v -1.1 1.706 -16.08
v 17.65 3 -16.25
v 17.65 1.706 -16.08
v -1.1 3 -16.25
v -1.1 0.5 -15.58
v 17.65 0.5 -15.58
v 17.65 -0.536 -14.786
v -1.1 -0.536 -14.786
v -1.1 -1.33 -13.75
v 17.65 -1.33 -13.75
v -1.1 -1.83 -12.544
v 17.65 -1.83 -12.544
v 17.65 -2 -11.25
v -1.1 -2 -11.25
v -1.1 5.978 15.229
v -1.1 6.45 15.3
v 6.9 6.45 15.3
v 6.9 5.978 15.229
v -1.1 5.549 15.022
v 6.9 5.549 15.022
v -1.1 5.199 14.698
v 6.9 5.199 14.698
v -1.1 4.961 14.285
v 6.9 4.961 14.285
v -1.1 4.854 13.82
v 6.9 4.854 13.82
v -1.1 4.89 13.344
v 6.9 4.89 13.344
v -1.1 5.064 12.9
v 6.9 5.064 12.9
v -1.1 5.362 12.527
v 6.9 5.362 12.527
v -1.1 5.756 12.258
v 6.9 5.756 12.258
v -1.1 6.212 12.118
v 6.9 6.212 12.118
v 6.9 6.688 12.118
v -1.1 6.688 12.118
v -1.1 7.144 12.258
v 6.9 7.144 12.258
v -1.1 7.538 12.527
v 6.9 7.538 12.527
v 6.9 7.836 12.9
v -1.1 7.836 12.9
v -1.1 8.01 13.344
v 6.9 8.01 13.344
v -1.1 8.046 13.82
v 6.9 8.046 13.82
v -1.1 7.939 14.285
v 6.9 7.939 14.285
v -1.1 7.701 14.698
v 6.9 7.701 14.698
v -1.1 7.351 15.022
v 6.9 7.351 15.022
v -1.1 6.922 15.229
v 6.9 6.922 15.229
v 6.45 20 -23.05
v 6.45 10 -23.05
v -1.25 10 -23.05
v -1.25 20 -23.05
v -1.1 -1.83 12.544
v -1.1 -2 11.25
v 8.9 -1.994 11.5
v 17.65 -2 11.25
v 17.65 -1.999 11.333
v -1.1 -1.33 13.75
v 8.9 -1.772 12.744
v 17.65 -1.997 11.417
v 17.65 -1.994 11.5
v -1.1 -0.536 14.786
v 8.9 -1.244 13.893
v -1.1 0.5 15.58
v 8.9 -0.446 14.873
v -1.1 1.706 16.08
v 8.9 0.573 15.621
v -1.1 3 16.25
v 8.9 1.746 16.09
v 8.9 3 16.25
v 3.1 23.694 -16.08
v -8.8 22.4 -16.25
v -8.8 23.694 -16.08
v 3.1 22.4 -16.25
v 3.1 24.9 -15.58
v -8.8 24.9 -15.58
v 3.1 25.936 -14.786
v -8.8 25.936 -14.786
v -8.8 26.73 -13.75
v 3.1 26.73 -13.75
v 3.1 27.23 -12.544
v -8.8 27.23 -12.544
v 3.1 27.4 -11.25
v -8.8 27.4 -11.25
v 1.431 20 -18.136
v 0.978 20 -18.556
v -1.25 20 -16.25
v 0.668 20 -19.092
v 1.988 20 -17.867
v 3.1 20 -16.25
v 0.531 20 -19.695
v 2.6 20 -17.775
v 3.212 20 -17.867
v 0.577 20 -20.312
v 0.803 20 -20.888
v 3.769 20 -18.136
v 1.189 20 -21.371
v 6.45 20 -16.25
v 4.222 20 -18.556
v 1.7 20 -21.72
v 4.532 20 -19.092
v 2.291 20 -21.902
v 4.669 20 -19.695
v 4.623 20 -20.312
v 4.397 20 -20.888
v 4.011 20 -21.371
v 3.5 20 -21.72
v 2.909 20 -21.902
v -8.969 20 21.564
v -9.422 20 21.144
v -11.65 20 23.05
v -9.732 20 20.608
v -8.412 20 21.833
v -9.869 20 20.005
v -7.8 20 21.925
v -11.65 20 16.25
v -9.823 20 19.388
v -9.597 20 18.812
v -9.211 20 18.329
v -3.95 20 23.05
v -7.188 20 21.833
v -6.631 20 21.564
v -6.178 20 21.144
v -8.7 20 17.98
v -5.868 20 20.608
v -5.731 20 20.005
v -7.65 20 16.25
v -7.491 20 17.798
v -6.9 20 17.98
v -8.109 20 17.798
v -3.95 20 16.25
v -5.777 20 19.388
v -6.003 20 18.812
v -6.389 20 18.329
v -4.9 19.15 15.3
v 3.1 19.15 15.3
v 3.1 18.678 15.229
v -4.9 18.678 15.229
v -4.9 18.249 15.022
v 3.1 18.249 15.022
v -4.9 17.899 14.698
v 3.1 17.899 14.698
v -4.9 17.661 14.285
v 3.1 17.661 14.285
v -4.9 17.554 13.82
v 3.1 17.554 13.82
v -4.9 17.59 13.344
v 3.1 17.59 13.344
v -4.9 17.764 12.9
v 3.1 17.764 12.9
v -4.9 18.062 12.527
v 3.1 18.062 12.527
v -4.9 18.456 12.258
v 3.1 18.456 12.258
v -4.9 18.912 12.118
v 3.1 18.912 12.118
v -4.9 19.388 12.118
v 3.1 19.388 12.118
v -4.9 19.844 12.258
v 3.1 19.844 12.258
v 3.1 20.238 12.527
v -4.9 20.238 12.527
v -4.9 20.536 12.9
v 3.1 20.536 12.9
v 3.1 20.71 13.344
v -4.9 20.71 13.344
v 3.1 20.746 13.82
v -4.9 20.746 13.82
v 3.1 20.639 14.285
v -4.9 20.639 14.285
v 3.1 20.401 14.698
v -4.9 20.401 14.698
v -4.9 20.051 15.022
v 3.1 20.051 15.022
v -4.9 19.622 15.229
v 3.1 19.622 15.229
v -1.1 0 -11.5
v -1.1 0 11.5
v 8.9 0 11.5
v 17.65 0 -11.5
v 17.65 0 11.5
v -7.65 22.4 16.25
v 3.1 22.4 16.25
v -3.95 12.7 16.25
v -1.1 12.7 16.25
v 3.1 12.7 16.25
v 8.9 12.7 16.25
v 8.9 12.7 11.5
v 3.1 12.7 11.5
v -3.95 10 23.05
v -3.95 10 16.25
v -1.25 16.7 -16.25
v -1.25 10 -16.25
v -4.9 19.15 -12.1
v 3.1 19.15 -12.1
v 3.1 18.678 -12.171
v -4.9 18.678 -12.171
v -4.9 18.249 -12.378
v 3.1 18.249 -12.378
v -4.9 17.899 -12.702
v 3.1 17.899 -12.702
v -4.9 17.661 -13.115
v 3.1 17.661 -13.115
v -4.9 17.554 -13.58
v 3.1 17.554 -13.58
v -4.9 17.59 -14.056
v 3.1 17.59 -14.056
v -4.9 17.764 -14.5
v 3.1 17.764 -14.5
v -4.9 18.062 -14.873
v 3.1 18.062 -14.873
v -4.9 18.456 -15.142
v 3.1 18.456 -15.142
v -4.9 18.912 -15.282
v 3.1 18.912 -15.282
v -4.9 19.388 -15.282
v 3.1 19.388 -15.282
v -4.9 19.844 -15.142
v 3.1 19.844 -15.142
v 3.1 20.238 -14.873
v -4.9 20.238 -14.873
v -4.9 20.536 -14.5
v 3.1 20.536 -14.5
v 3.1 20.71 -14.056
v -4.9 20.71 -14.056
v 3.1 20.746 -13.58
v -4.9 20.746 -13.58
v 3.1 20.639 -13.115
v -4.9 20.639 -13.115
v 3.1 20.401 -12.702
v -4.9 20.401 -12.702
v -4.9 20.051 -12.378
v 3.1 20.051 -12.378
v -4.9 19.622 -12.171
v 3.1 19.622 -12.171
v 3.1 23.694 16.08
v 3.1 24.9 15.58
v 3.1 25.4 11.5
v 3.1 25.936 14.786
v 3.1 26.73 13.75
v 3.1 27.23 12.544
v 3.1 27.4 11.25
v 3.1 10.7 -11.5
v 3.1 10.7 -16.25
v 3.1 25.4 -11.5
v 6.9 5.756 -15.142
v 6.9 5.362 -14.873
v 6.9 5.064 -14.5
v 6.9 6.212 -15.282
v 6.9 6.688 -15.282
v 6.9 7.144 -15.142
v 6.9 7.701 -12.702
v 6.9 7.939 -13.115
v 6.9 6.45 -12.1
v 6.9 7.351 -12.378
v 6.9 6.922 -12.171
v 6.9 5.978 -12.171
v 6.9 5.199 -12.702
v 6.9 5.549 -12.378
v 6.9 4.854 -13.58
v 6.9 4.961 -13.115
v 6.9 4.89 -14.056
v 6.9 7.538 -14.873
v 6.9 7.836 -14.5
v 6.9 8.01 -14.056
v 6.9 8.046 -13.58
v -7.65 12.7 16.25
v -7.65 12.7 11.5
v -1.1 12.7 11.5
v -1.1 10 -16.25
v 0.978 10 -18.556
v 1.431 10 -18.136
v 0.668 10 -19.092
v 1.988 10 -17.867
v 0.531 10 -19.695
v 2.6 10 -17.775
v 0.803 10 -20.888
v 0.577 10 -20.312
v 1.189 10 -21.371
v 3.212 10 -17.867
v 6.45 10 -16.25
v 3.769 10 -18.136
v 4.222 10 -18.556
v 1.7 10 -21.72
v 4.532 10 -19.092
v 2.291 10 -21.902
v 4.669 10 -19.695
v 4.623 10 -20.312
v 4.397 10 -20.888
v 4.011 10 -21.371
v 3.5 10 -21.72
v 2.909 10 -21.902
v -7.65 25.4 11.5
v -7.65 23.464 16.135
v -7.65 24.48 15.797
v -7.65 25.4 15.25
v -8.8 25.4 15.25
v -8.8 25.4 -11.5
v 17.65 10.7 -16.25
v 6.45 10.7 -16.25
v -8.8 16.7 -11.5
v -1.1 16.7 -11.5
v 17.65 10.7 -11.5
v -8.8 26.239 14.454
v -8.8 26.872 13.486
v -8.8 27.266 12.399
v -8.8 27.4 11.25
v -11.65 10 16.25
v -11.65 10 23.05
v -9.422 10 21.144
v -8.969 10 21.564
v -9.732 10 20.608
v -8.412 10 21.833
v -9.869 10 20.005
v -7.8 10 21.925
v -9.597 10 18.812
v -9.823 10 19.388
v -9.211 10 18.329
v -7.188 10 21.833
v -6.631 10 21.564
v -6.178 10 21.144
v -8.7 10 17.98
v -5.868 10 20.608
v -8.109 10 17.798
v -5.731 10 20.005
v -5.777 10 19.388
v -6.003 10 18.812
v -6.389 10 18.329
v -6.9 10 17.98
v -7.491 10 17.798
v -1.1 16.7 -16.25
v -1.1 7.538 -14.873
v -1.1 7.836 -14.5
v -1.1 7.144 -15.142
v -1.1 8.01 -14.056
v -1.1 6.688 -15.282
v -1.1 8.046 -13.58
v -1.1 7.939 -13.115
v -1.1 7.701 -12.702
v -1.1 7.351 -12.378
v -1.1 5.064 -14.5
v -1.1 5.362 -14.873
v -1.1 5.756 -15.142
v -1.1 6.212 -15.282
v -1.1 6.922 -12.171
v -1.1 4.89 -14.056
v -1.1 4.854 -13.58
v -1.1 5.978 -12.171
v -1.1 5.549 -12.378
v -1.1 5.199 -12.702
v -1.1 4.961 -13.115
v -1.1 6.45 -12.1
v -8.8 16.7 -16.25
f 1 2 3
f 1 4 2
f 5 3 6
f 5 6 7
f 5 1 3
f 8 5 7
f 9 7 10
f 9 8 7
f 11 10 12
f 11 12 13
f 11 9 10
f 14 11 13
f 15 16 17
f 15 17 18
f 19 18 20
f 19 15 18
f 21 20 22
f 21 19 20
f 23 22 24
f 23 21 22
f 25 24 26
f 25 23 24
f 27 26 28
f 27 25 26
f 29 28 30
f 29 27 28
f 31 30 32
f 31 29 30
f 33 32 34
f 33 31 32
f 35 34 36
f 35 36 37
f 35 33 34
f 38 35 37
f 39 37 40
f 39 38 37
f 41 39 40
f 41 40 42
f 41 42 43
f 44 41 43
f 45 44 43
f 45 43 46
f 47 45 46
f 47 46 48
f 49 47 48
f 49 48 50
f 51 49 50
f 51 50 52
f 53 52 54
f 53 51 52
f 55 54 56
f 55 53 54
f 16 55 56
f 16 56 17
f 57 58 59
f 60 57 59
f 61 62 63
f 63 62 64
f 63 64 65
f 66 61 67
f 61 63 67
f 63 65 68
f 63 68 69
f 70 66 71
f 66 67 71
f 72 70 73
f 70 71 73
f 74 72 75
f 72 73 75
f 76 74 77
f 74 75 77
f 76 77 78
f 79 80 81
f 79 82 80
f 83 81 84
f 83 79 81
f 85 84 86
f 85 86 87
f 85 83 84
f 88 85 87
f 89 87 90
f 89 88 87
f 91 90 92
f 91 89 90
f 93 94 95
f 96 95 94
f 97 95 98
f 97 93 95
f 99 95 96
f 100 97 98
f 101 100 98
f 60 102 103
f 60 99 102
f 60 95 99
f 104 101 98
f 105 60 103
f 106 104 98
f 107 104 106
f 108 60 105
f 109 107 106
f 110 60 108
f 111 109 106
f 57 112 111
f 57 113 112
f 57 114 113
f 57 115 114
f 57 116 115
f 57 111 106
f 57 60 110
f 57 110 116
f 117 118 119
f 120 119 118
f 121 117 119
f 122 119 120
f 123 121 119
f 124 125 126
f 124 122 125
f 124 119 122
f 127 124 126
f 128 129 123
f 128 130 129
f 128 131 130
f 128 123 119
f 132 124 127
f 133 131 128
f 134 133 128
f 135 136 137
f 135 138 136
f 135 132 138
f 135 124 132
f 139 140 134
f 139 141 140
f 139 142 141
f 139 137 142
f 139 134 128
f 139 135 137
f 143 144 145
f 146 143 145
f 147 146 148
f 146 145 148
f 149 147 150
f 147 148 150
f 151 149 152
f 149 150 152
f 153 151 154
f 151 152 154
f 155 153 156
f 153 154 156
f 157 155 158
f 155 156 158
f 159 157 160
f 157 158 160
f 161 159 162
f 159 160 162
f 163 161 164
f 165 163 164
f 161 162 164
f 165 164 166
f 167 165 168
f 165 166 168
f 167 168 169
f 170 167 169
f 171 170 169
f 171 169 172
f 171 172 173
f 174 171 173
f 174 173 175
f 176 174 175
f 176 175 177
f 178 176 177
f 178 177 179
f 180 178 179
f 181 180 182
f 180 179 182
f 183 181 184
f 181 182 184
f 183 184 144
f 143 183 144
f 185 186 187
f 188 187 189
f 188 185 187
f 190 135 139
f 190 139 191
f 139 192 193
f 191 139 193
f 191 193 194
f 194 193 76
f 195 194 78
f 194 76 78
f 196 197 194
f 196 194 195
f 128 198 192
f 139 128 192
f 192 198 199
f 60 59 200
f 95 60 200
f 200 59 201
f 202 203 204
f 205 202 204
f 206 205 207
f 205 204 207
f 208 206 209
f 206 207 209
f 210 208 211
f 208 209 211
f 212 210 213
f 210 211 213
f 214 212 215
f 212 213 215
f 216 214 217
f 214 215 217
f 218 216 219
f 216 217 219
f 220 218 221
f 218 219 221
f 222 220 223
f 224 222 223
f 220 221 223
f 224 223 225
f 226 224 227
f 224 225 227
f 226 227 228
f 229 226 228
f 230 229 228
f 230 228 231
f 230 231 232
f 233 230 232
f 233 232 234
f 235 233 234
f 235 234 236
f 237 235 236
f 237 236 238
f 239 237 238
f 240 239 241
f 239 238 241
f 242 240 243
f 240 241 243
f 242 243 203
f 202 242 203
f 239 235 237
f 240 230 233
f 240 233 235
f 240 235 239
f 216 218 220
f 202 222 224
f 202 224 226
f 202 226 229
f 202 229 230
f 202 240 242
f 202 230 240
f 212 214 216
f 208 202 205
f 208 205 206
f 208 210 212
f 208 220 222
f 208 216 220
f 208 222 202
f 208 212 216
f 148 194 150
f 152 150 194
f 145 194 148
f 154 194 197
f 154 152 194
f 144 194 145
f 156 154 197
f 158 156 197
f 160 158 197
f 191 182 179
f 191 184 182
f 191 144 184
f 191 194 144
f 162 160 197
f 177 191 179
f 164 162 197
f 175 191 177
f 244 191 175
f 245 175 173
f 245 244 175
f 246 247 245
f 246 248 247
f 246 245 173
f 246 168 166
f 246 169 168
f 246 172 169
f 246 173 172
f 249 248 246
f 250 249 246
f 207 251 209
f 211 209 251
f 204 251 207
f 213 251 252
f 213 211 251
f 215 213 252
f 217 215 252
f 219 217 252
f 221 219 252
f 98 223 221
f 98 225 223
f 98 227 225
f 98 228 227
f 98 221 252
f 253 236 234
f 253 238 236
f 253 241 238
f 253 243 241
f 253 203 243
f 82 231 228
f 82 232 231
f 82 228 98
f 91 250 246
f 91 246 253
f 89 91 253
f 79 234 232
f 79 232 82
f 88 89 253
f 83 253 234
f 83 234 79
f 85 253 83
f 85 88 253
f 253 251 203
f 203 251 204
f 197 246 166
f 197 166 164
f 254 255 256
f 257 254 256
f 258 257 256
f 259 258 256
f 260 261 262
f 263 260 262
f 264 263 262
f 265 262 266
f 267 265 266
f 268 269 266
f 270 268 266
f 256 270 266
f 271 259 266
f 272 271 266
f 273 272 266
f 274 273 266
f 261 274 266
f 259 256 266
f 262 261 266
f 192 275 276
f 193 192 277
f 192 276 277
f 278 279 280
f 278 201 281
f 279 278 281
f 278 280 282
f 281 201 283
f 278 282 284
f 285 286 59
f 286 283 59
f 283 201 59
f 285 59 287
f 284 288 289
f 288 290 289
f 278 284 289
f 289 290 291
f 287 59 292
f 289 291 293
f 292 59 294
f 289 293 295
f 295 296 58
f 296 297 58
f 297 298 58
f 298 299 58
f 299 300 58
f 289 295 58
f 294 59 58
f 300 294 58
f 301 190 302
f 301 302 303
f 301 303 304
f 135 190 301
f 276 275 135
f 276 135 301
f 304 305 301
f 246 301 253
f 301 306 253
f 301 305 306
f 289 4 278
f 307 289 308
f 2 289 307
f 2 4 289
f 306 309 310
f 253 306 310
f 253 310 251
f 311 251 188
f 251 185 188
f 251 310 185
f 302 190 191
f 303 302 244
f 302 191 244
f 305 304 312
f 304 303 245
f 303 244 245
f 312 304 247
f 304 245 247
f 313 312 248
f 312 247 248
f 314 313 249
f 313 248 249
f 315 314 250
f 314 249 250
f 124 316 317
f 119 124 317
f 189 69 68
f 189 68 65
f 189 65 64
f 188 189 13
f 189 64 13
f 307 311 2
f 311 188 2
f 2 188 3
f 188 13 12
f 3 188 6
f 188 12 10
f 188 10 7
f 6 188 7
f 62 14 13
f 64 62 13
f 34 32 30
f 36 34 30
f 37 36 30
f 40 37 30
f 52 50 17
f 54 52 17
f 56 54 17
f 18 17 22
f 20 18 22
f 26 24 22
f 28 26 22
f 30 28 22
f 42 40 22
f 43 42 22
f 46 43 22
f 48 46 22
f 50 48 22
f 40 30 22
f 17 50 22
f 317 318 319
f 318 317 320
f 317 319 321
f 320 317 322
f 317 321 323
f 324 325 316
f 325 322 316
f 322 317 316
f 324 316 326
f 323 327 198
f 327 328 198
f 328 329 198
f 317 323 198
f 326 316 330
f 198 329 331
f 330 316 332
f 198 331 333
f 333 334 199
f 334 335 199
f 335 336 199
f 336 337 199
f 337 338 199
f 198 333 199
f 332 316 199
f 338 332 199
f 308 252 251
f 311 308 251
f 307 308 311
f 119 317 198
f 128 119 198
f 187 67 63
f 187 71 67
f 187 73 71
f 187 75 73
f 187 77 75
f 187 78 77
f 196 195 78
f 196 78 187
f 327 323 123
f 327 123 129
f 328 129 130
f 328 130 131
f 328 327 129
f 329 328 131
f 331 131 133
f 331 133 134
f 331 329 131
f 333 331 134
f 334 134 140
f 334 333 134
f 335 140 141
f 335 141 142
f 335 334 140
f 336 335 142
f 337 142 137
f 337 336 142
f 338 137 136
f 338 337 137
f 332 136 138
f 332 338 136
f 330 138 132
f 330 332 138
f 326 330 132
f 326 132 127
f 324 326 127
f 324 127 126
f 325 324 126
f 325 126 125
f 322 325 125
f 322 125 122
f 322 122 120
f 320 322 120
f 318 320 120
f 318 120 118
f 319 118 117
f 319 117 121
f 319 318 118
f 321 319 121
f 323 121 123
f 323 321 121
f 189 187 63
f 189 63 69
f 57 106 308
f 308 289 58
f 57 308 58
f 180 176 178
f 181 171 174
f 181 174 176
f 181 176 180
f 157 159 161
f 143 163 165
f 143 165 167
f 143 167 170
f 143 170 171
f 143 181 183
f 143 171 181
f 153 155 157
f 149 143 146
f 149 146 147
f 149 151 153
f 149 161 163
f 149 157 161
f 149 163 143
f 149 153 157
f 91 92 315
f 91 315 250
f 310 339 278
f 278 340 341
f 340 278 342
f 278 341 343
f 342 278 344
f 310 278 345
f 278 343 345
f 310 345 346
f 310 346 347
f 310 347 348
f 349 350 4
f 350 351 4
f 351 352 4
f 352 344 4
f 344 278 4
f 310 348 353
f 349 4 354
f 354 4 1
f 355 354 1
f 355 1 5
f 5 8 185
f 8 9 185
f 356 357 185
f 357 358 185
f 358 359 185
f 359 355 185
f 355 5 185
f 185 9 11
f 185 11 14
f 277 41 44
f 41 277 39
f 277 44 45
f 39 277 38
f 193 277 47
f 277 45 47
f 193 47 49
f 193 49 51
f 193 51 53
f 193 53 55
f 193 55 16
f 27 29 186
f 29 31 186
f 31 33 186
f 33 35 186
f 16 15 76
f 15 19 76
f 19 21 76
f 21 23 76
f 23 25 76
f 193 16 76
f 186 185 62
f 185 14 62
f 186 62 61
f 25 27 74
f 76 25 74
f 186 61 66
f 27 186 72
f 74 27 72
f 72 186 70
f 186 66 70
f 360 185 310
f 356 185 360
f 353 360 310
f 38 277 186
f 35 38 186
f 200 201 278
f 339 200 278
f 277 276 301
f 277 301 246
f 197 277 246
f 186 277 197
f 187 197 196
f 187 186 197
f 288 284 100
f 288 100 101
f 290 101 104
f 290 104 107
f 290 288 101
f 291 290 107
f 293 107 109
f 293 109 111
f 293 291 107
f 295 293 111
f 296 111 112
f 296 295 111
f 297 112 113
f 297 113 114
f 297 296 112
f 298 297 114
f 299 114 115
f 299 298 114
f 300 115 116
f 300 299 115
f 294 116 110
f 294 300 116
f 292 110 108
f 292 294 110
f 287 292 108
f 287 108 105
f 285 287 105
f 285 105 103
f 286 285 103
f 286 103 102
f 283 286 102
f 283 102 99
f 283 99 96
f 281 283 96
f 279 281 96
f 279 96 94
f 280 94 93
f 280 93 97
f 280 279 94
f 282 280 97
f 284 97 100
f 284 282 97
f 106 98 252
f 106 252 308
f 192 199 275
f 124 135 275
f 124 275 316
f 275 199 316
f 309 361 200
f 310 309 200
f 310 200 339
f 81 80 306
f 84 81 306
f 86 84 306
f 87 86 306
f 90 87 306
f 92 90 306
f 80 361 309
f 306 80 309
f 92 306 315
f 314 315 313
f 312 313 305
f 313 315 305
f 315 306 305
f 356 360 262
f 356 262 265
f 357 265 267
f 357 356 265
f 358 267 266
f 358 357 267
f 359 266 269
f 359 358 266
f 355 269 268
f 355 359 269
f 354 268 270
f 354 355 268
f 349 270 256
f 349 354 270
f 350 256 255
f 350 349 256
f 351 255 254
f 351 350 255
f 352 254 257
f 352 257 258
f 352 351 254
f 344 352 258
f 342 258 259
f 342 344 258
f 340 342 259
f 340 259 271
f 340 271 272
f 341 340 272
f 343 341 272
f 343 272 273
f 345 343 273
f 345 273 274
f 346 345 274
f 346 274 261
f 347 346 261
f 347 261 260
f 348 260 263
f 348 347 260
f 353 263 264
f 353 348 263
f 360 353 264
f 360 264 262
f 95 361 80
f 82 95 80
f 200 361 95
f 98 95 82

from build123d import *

# Parameters (mm, degrees)
BOSS_EXTRUDE1_DEPTH = 2
SKETCH1_3_W         = 10
SKETCH1_3_H         = 4.75
BOSS_EXTRUDE2_DEPTH = 12.7
BOSS_EXTRUDE3_START = 12.7
SKETCH3_W           = 11.9
SKETCH3_H           = 4.75
SKETCH3_W_2         = 10.75
BOSS_EXTRUDE3_DEPTH = 12.7
BOSS_EXTRUDE4_START = 25.4
SKETCH3_3_W         = 11.9
SKETCH3_3_H         = 4.75
SKETCH3_3_W_2       = 10.75
SKETCH3_3_W_3       = 1.15
BOSS_EXTRUDE4_DEPTH = 2
CUT_EXTRUDE1_START  = -1.1
SKETCH2_R           = 1.6
CUT_EXTRUDE1_DEPTH  = 8
CUT_EXTRUDE2_START  = 3.1
SKETCH2_3_R         = 1.6
CUT_EXTRUDE2_DEPTH  = 8
BOSS_EXTRUDE5_START = 10
SKETCH1_4_R         = 2.075
BOSS_EXTRUDE5_DEPTH = 10
FILLET1_R           = 5
CUT_EXTRUDE3_START  = 12.7
SKETCH5_W           = 14.55
SKETCH5_H           = 4.75
CUT_EXTRUDE3_DEPTH  = 2
CUT_EXTRUDE4_START  = 12.7
SKETCH6_W           = 7.7
SKETCH6_H           = 4.75
CUT_EXTRUDE4_DEPTH  = 4


with BuildPart() as part:
    # Sketch1 → Boss-Extrude1 (new body)
    with BuildSketch(Plane(origin=(0, 0, 0), x_dir=(1, 0, 0), z_dir=(0, 1, 0))):
        Polygon((-1.1, 16.25), (-1.1, -16.25), (8.9, -16.25), (8.9, -11.5), (17.65, -11.5), (17.65, 16.25), align=None)
    extrude(amount=-BOSS_EXTRUDE1_DEPTH)

    # Sketch1<3> → Boss-Extrude2 (add)
    with BuildSketch(Plane(origin=(0, 0, 0), x_dir=(1, 0, 0), z_dir=(0, 1, 0))):
        Polygon((6.45, 16.25), (-1.1, 16.25), (-1.1, 11.5), (17.65, 11.5), (17.65, 16.25), align=None)
        with Locations((3.9, -13.875)):
            Rectangle(SKETCH1_3_W, SKETCH1_3_H)
    extrude(amount=BOSS_EXTRUDE2_DEPTH)

    # Sketch3 → Boss-Extrude3 (add)
    with BuildSketch(Plane(origin=(0, 0, 0), x_dir=(1, 0, 0), z_dir=(0, 1, 0)).offset(BOSS_EXTRUDE3_START)):
        with Locations((-2.85, 13.875)):
            Rectangle(SKETCH3_W, SKETCH3_H)
        with Locations((-2.275, -13.875)):
            Rectangle(SKETCH3_W_2, SKETCH3_H)
    extrude(amount=BOSS_EXTRUDE3_DEPTH)

    # Sketch3<3> → Boss-Extrude4 (add)
    with BuildSketch(Plane(origin=(0, 0, 0), x_dir=(1, 0, 0), z_dir=(0, 1, 0)).offset(BOSS_EXTRUDE4_START)):
        with Locations((-2.85, 13.875)):
            Rectangle(SKETCH3_3_W, SKETCH3_3_H)
        Polygon((3.1, -11.5), (3.1, 11.5), (-8.8, 11.5), (-8.8, -11.5), (-7.65, -11.5), align=None)
        with Locations((-2.275, -13.875)):
            Rectangle(SKETCH3_3_W_2, SKETCH3_3_H)
        with Locations((-8.225, -13.875)):
            Rectangle(SKETCH3_3_W_3, SKETCH3_3_H)
    extrude(amount=BOSS_EXTRUDE4_DEPTH)

    # Sketch2 → Cut-Extrude1 (cut)
    with BuildSketch(Plane(origin=(0, 0, 0), x_dir=(0, 0, -1), z_dir=(1, 0, 0)).offset(CUT_EXTRUDE1_START)):
        with Locations(Location((-13.7, 6.45, 0), (0, 0, 180))):
            Circle(SKETCH2_R)
        with Locations(Location((13.7, 6.45, 0), (0, 0, 180))):
            Circle(SKETCH2_R)
    extrude(amount=CUT_EXTRUDE1_DEPTH, mode=Mode.SUBTRACT)

    # Sketch2<3> → Cut-Extrude2 (cut)
    with BuildSketch(Plane(origin=(0, 0, 0), x_dir=(0, 0, -1), z_dir=(1, 0, 0)).offset(CUT_EXTRUDE2_START)):
        with Locations(Location((13.7, 19.15, 0), (0, 0, 180))):
            Circle(SKETCH2_3_R)
        with Locations(Location((-13.7, 19.15, 0), (0, 0, 180))):
            Circle(SKETCH2_3_R)
    extrude(amount=-CUT_EXTRUDE2_DEPTH, mode=Mode.SUBTRACT)

    # Sketch1<4> → Boss-Extrude5 (add)
    # profile 1 of 2: a face of its own
    with BuildSketch(Plane(origin=(0, 0, 0), x_dir=(1, 0, 0), z_dir=(0, 1, 0)).offset(BOSS_EXTRUDE5_START)):
        Polygon((-1.25, 16.25), (-1.1, 16.25), (6.45, 16.25), (6.45, 23.05), (-1.25, 23.05), align=None)
        with Locations(Location((2.6, 19.85, 0), (0, 0, 270))):
            Circle(SKETCH1_4_R, mode=Mode.SUBTRACT)
    # profile 2 of 2: a face of its own
    with BuildSketch(Plane(origin=(0, 0, 0), x_dir=(1, 0, 0), z_dir=(0, 1, 0)).offset(BOSS_EXTRUDE5_START)):
        Polygon((-3.95, -23.05), (-3.95, -16.25), (-8.8, -16.25), (-11.65, -16.25), (-11.65, -23.05), align=None)
        with Locations(Location((-7.8, -19.85, 0), (0, 0, 270))):
            Circle(SKETCH1_4_R, mode=Mode.SUBTRACT)
    extrude(amount=BOSS_EXTRUDE5_DEPTH)

    # Fillet1
    fillet1_edges = [part.edges().sort_by_distance(p)[0] for p in [
        (3.9, -2, 16.25),
        (-2.85, 27.4, 16.25),
        (8.275, -2, -16.25),
        (-2.85, 27.4, -16.25),
    ]]
    fillet(fillet1_edges, radius=FILLET1_R)

    # Sketch5 → Cut-Extrude3 (cut)
    with BuildSketch(Plane(origin=(0, 0, 0), x_dir=(1, 0, 0), z_dir=(0, 1, 0)).offset(CUT_EXTRUDE3_START)):
        with Locations((10.375, 13.875)):
            Rectangle(SKETCH5_W, SKETCH5_H)
    extrude(amount=-CUT_EXTRUDE3_DEPTH, mode=Mode.SUBTRACT)

    # Sketch6 → Cut-Extrude4 (cut)
    with BuildSketch(Plane(origin=(0, 0, 0), x_dir=(1, 0, 0), z_dir=(0, 1, 0)).offset(CUT_EXTRUDE4_START)):
        with Locations((-4.95, 13.875)):
            Rectangle(SKETCH6_W, SKETCH6_H)
    extrude(amount=CUT_EXTRUDE4_DEPTH, mode=Mode.SUBTRACT)


solid = part.part
